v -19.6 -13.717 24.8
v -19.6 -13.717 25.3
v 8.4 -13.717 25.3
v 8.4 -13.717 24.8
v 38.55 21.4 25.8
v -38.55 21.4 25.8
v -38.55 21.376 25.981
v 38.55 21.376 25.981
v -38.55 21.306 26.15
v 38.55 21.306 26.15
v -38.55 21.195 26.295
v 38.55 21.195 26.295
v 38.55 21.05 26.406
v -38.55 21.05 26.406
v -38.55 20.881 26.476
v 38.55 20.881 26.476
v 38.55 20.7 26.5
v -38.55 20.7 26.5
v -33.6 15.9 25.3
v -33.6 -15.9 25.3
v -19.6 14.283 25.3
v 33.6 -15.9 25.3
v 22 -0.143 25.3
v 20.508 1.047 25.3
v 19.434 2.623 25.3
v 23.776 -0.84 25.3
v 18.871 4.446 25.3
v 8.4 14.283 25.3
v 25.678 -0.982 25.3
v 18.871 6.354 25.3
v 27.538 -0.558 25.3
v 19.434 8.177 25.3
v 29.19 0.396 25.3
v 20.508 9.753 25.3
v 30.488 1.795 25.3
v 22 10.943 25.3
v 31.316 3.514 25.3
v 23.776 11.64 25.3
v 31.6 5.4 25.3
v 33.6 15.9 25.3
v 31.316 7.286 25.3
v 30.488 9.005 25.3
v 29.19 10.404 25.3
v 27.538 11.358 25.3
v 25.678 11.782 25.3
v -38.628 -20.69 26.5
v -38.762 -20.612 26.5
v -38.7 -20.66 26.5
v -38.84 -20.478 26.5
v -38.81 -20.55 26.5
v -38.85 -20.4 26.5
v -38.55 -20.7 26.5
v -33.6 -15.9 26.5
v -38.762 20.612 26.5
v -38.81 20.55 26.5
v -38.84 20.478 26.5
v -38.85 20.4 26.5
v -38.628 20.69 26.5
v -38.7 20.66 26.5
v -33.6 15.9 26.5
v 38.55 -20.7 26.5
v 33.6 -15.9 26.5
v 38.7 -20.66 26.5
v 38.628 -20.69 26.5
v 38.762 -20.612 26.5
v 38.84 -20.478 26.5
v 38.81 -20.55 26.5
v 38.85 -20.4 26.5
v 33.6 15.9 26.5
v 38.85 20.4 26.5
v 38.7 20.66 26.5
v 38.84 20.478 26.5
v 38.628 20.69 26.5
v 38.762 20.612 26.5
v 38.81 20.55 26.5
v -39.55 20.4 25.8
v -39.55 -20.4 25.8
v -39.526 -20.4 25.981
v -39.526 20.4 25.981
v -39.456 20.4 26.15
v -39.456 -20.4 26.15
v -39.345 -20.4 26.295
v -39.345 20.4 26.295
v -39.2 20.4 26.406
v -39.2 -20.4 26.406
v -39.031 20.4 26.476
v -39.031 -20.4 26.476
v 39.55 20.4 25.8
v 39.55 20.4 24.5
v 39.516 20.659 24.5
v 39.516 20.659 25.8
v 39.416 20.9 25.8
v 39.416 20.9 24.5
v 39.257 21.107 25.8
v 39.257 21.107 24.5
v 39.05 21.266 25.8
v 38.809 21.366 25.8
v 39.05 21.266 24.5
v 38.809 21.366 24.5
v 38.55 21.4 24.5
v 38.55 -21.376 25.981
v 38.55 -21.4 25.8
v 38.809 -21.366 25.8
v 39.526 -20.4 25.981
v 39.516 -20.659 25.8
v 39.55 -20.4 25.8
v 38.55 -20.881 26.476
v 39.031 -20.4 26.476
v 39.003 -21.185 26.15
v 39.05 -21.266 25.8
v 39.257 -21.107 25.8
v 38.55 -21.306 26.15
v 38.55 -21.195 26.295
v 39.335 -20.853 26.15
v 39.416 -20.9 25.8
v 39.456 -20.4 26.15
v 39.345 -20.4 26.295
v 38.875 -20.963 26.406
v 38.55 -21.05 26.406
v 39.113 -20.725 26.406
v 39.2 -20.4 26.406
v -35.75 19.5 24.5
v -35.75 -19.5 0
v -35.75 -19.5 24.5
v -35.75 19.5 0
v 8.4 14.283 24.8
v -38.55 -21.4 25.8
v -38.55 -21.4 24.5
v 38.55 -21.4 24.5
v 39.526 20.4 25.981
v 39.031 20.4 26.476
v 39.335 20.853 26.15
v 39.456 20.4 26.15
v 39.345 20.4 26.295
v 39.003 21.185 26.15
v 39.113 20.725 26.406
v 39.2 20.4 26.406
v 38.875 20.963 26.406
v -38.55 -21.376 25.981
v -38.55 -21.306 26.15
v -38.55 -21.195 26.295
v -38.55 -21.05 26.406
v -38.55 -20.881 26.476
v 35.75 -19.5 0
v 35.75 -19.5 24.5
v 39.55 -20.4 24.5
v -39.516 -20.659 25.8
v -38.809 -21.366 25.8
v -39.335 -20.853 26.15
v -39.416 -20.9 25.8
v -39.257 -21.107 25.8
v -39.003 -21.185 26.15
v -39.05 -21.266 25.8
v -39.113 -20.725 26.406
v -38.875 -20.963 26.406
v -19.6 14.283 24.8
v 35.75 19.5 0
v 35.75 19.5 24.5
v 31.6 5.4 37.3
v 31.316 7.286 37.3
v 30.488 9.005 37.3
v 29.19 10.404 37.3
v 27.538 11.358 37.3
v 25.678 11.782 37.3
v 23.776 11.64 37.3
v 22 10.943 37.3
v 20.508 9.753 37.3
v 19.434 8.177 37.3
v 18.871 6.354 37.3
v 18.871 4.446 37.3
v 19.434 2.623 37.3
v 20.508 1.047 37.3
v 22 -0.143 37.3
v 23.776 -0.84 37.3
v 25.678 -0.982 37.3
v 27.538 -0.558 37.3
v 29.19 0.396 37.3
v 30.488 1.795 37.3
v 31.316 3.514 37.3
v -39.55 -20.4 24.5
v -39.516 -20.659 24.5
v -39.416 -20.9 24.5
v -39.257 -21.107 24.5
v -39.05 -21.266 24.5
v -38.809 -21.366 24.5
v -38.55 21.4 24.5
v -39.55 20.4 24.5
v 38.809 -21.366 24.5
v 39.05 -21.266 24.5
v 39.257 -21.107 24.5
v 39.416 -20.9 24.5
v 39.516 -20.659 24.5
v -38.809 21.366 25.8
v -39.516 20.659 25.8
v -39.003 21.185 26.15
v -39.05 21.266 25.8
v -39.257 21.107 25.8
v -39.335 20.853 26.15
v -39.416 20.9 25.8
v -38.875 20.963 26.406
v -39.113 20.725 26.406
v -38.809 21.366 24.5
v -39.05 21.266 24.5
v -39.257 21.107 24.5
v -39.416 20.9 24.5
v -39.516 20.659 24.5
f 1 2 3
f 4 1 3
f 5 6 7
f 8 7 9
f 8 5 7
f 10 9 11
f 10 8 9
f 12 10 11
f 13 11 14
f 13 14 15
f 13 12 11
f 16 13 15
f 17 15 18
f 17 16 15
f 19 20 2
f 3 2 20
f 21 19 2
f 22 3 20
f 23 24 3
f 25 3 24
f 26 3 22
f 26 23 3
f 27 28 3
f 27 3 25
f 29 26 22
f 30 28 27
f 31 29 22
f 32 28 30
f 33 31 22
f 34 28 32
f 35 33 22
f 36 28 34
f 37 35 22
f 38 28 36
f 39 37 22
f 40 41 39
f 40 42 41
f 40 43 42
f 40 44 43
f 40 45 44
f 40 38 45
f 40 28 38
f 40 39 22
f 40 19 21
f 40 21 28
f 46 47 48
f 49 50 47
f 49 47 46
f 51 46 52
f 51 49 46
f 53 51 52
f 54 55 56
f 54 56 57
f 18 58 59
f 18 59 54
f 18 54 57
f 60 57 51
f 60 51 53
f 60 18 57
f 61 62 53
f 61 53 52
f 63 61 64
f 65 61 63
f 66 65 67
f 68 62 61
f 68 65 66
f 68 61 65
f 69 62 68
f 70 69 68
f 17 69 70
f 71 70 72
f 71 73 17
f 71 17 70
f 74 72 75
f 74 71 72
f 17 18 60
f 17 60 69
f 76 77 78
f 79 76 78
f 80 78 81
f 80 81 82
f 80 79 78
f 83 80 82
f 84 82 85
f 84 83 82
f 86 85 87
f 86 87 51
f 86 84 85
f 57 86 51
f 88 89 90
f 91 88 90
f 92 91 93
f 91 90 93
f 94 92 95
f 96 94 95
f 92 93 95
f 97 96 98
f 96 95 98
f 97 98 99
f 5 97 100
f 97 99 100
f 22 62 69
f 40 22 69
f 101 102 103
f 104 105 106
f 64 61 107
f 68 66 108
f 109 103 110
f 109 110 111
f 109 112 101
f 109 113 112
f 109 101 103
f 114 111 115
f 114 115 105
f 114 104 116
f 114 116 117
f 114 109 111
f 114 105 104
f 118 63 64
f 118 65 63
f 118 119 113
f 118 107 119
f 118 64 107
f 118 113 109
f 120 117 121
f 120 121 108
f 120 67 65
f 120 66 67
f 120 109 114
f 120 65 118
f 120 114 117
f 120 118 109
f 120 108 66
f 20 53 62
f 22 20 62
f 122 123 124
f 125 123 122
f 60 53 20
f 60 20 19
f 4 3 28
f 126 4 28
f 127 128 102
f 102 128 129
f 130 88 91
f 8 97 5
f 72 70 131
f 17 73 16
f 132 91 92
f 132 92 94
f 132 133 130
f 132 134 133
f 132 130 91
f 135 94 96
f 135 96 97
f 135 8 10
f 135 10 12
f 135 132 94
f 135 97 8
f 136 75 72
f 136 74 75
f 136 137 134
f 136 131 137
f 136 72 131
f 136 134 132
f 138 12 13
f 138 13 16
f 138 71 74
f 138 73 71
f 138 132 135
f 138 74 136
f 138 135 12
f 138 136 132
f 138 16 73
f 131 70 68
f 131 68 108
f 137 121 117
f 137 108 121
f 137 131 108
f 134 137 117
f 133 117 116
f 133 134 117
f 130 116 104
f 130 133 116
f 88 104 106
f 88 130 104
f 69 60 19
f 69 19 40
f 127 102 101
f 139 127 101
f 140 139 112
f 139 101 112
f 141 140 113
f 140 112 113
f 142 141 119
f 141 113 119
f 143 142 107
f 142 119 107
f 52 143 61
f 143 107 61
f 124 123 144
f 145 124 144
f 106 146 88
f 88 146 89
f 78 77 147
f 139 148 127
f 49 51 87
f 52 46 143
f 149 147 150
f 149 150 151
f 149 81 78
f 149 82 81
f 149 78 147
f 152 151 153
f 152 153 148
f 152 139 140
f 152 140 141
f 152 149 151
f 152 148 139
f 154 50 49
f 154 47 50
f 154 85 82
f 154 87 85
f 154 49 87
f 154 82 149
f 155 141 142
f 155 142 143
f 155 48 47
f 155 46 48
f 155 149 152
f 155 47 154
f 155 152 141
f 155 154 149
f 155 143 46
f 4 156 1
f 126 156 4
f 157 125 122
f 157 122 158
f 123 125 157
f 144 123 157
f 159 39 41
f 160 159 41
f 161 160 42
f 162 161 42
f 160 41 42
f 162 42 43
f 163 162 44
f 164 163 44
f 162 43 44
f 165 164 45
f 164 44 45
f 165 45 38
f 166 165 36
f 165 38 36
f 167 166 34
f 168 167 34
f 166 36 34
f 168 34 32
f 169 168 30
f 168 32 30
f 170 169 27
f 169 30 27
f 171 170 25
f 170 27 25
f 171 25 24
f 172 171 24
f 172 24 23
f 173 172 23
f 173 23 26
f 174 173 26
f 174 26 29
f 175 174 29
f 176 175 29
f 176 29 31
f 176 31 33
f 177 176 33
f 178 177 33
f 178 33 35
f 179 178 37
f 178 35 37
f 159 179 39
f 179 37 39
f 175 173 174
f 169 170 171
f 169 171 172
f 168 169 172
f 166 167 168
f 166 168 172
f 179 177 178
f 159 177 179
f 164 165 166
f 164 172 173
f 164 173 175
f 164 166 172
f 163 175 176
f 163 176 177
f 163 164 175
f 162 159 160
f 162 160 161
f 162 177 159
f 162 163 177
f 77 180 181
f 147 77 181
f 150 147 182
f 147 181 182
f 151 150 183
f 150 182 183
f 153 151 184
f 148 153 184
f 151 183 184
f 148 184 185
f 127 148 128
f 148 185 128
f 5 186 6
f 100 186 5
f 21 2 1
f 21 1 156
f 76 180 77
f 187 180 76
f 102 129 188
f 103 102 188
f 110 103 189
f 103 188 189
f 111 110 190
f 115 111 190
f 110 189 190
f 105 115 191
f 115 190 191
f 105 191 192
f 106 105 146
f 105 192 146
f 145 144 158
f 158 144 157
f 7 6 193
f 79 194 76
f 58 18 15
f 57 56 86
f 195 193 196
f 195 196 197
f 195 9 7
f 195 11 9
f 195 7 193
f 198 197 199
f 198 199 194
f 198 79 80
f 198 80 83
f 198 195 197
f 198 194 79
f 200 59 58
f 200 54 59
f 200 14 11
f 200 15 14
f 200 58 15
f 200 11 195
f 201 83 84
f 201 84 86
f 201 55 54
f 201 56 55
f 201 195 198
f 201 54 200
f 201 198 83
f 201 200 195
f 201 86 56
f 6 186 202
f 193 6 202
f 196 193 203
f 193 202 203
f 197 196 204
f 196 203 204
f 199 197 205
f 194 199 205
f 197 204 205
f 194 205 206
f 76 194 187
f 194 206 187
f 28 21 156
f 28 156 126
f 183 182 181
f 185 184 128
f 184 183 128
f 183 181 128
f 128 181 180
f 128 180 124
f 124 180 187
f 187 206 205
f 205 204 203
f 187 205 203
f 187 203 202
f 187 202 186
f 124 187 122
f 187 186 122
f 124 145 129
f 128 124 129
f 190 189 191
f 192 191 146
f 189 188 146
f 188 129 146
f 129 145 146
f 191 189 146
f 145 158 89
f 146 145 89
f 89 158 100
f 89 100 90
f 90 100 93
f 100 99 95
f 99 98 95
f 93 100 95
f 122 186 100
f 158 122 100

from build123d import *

# Parameters (mm, degrees)
SKETCH_1_W          = 71.5
SKETCH_1_H          = 39
EXTRUDE_1_DEPTH     = 24.5
SKETCH_2_W          = 79.1
SKETCH_2_H          = 42.8
EXTRUDE_2_DEPTH     = 2
FILLET_1_R          = 0.7
FILLET_2_R          = 1
SKETCH_3_W          = 67.2
SKETCH_3_H          = 31.8
CUT_EXTRUDE_1_DEPTH = 1.2
SKETCH_4_R          = 6.4
EXTRUDE_3_DEPTH     = 12
SKETCH_5_W          = 28
SKETCH_5_H          = 28
CUT_EXTRUDE_2_DEPTH = 0.5


with BuildPart() as part:
    # Эскиз1 → Бобышка-Вытянуть1 (new body)
    with BuildSketch(Plane.XY):
        Rectangle(SKETCH_1_W, SKETCH_1_H)
    extrude(amount=EXTRUDE_1_DEPTH)

    # Эскиз2 → Бобышка-Вытянуть2 (add)
    with BuildSketch(Plane.XY.offset(24.5)):
        Rectangle(SKETCH_2_W, SKETCH_2_H)
    extrude(amount=EXTRUDE_2_DEPTH)

    # Скругление1
    fillet_1_edges = [part.edges().sort_by_distance(p)[0] for p in [
        (39.55, 0, 26.5),
        (0, 21.4, 26.5),
        (-39.55, 0, 26.5),
        (0, -21.4, 26.5),
    ]]
    fillet(fillet_1_edges, radius=FILLET_1_R)

    # Скругление2
    # the kernel refuses this fillet: 1 mm, written as the material it takes off along each edge
    with BuildSketch(Plane(origin=(-38.55, 20.4, 26.5), x_dir=(0, 1, 0), z_dir=(1, 0, 0))) as fillet_2_piece_1:
        with BuildLine():
            CenterArc((0.3, -0.7), 0.7, 0, 90)
            Line((1, -0.7), (1, 0))
            Line((1, 0), (0.3, 0))
        make_face()
    revolve(axis=Axis((-38.55, 20.4, 26.5), (0, 0, 1)), revolution_arc=90, mode=Mode.SUBTRACT)
    with BuildSketch(Plane(origin=(38.55, 20.4, 26.5), x_dir=(1, 0, 0), z_dir=(0, -1, 0))) as fillet_2_piece_2:
        with BuildLine():
            CenterArc((0.3, -0.7), 0.7, 0, 90)
            Line((1, -0.7), (1, 0))
            Line((1, 0), (0.3, 0))
        make_face()
    revolve(axis=Axis((38.55, 20.4, 26.5), (0, 0, 1)), revolution_arc=90, mode=Mode.SUBTRACT)
    with BuildSketch(Plane(origin=(-38.55, -20.4, 26.5), x_dir=(-1, 0, 0), z_dir=(0, 1, 0))) as fillet_2_piece_3:
        with BuildLine():
            CenterArc((0.3, -0.7), 0.7, 0, 90)
            Line((1, -0.7), (1, 0))
            Line((1, 0), (0.3, 0))
        make_face()
    revolve(axis=Axis((-38.55, -20.4, 26.5), (0, 0, 1)), revolution_arc=90, mode=Mode.SUBTRACT)
    with BuildSketch(Plane(origin=(38.55, -20.4, 26.5), x_dir=(0, -1, 0), z_dir=(-1, 0, 0))) as fillet_2_piece_4:
        with BuildLine():
            CenterArc((0.3, -0.7), 0.7, 0, 90)
            Line((1, -0.7), (1, 0))
            Line((1, 0), (0.3, 0))
        make_face()
    revolve(axis=Axis((38.55, -20.4, 26.5), (0, 0, 1)), revolution_arc=90, mode=Mode.SUBTRACT)
    with BuildSketch(Plane(origin=(39.55, -21.4, 22), x_dir=(0, 1, 0), z_dir=(0, 0, 1)), Plane(origin=(39.55, 21.4, 22), x_dir=(-1, 0, 0), z_dir=(0, 0, 1))) as fillet_2_piece_5:
        with BuildLine():
            CenterArc((FILLET_2_R, FILLET_2_R), FILLET_2_R, 180, 90)
            Line((0, FILLET_2_R), (0, 0))
            Line((0, 0), (FILLET_2_R, 0))
        make_face()
    extrude(amount=4.5, mode=Mode.SUBTRACT)
    with BuildSketch(Plane(origin=(-39.55, -21.4, 22), x_dir=(0, 1, 0), z_dir=(0, 0, 1)), Plane(origin=(-39.55, 21.4, 22), x_dir=(1, 0, 0), z_dir=(0, 0, 1))) as fillet_2_piece_6:
        with BuildLine():
            CenterArc((FILLET_2_R, -FILLET_2_R), FILLET_2_R, 90, 90)
            Line((0, -FILLET_2_R), (0, 0))
            Line((0, 0), (FILLET_2_R, 0))
        make_face()
    extrude(amount=4.5, mode=Mode.SUBTRACT)

    # Эскиз3 → Вырез-Вытянуть1 (cut)
    with BuildSketch(Plane.XY.offset(26.5)):
        Rectangle(SKETCH_3_W, SKETCH_3_H)
    extrude(amount=-CUT_EXTRUDE_1_DEPTH, mode=Mode.SUBTRACT)

    # Эскиз4 → Бобышка-Вытянуть3 (add)
    with BuildSketch(Plane.XY.offset(25.3)):
        with Locations((25.2, 5.4)):
            Circle(SKETCH_4_R)
    extrude(amount=EXTRUDE_3_DEPTH)

    # Эскиз5 → Вырез-Вытянуть2 (cut)
    with BuildSketch(Plane.XY.offset(25.3)):
        with Locations((-5.6, 0.282517759)):
            Rectangle(SKETCH_5_W, SKETCH_5_H)
    extrude(amount=-CUT_EXTRUDE_2_DEPTH, mode=Mode.SUBTRACT)


solid = part.part
